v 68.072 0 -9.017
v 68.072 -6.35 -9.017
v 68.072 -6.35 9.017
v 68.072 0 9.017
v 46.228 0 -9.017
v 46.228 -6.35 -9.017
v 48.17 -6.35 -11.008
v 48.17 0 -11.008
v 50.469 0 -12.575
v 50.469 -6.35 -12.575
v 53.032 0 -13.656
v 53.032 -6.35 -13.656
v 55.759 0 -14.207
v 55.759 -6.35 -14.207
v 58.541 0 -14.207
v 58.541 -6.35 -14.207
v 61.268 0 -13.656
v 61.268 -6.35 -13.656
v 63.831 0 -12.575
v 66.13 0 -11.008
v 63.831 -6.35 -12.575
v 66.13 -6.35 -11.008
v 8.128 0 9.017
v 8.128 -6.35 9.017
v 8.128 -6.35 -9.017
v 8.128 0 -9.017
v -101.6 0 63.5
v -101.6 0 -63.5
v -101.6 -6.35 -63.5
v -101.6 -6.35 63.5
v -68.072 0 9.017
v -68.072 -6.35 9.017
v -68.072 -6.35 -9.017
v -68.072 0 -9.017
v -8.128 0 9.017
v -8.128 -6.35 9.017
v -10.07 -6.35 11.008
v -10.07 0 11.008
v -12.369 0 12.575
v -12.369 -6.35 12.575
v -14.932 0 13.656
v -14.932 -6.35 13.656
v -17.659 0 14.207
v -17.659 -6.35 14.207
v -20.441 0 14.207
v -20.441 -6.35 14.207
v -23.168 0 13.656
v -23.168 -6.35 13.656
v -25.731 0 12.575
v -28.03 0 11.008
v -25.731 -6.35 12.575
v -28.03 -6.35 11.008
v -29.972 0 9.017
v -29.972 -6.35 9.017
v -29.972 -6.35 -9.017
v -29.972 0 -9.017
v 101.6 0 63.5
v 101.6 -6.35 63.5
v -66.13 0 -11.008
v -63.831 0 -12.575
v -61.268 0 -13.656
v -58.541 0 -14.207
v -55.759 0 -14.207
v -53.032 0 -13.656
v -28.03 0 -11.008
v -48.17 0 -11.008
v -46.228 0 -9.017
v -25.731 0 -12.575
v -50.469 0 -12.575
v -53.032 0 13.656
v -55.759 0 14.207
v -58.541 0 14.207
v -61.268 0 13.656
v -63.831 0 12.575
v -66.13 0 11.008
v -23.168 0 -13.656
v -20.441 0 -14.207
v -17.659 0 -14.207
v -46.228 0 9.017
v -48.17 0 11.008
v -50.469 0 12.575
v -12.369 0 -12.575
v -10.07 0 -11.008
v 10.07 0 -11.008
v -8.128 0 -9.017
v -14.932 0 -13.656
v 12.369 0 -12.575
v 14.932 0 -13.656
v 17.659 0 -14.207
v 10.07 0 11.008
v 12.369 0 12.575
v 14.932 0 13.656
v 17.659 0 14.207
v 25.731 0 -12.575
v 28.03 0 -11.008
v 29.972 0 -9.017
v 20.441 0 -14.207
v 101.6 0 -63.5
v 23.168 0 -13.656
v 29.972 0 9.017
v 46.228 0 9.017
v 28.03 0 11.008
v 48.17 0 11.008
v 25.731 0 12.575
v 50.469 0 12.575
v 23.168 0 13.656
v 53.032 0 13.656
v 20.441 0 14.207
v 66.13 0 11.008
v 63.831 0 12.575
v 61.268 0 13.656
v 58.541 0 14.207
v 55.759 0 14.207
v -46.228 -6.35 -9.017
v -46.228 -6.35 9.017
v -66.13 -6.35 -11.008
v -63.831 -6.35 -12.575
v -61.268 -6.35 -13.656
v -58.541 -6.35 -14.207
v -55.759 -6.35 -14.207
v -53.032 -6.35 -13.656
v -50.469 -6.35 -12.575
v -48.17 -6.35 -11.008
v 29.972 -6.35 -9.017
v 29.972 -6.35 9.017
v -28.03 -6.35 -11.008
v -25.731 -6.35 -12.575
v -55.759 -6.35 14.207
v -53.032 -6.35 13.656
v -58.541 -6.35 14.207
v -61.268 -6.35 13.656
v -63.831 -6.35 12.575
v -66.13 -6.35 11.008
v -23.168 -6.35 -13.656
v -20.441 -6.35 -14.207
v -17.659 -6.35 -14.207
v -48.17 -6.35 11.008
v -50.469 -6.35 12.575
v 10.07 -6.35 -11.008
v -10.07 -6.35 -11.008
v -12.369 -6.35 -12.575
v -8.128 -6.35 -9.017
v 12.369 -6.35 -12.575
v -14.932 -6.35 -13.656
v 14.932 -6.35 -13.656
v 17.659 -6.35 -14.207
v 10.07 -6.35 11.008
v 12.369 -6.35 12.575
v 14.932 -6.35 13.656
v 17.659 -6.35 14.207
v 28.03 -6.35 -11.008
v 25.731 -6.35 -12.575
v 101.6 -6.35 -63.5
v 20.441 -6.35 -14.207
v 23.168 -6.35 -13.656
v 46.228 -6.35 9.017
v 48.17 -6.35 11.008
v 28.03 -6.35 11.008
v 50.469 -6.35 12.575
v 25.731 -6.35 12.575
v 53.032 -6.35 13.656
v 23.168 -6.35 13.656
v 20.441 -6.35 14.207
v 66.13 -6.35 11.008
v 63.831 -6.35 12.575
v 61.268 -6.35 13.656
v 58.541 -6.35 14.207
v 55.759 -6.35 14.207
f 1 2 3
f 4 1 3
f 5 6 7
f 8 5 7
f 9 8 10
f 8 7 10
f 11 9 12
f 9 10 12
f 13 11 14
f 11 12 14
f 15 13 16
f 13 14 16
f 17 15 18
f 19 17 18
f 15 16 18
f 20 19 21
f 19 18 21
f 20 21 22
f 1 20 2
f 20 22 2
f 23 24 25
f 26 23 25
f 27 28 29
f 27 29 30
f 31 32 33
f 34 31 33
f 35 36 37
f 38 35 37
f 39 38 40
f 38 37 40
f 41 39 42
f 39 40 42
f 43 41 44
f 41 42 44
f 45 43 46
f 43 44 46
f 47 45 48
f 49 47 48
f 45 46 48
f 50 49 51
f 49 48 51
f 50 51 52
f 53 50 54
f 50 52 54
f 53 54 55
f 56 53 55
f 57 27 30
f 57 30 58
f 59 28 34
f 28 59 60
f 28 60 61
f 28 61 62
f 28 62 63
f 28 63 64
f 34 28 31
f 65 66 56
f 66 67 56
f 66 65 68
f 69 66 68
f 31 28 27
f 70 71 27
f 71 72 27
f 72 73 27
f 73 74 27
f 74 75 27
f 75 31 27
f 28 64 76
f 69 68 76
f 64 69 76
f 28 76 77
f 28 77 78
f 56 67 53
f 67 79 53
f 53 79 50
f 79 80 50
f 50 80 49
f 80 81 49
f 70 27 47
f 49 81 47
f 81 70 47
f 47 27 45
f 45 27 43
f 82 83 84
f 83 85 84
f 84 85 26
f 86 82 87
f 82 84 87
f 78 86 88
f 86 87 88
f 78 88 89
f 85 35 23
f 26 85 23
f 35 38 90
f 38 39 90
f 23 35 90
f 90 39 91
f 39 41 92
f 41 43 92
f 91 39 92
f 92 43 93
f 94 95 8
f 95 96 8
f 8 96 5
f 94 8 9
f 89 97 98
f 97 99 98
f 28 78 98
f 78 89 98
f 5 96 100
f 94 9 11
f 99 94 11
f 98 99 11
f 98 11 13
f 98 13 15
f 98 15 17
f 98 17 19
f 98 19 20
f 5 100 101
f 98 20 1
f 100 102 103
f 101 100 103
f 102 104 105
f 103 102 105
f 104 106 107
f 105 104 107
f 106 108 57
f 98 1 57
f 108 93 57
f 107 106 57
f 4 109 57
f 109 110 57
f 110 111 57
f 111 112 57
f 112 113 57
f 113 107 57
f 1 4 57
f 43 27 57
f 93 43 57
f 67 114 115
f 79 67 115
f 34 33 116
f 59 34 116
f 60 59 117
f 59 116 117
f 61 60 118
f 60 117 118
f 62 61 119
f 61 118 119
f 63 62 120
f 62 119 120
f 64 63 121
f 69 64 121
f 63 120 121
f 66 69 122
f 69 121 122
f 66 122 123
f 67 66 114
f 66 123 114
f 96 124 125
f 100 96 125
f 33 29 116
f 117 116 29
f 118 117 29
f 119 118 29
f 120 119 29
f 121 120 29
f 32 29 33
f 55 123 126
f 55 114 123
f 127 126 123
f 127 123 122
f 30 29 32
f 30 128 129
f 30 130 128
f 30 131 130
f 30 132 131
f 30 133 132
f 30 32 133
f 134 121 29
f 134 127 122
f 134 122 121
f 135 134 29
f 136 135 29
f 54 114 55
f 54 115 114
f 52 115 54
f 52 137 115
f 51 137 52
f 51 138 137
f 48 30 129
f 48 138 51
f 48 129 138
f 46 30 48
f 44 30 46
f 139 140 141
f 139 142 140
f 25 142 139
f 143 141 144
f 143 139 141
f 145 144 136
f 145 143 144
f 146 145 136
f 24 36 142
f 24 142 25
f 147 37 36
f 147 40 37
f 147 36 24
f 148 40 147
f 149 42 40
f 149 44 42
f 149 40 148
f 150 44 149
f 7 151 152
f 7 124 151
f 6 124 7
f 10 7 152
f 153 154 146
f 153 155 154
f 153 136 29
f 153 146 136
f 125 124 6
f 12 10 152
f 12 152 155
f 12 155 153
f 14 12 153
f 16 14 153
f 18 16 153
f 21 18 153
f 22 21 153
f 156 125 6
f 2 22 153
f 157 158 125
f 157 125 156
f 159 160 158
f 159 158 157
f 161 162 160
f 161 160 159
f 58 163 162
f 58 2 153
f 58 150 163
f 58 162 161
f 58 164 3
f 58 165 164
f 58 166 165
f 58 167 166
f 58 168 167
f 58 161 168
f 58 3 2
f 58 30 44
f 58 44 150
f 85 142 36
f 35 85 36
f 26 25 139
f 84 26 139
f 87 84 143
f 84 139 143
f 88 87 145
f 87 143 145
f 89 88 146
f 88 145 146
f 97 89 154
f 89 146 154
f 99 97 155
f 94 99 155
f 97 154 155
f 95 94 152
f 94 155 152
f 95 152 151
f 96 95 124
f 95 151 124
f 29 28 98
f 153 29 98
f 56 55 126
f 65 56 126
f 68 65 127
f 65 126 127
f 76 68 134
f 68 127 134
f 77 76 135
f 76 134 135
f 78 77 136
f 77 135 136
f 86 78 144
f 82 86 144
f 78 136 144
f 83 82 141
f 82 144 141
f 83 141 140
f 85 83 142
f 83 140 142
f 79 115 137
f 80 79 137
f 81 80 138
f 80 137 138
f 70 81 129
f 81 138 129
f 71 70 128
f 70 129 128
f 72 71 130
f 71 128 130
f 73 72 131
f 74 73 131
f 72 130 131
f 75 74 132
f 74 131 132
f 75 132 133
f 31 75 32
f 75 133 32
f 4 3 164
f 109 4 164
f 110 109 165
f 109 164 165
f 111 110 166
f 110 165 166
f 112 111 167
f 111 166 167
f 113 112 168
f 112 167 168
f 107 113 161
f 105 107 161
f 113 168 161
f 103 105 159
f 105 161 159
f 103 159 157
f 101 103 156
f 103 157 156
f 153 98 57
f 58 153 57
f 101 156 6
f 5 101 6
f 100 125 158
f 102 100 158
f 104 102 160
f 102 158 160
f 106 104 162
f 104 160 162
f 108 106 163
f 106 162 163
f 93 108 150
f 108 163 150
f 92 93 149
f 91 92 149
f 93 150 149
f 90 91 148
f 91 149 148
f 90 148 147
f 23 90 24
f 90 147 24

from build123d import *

# Parameters (mm, degrees)
F0_W     = 203.2
F0_H     = 127
F1_DEPTH = 6.35
F3_DEPTH = 6.35


with BuildPart() as f1:
    # F0 (on Front) → F1 (new body)
    with BuildSketch(Plane.XZ):
        Rectangle(F0_W, F0_H)
    extrude(amount=F1_DEPTH)

    # F2 (on face) → F3 (cut, through all)
    with BuildSketch(Plane.XZ.offset(6.35)):
        with BuildLine():
            Line((-68.072, 9.017), (-68.072, 0))
            Line((-68.072, 0), (-68.072, -9.017))
            ThreePointArc((-68.072, -9.017), (-57.15, -14.276614), (-46.228, -9.017))
            Line((-46.228, -9.017), (-46.228, 0))
            Line((-46.228, 0), (-46.228, 9.017))
            ThreePointArc((-46.228, 9.017), (-57.15, 14.276614), (-68.072, 9.017))
        make_face()
        with BuildLine():
            Line((-29.972, 9.017), (-29.972, 0))
            Line((-29.972, 0), (-29.972, -9.017))
            ThreePointArc((-29.972, -9.017), (-19.05, -14.276614), (-8.128, -9.017))
            Line((-8.128, -9.017), (-8.128, 0))
            Line((-8.128, 0), (-8.128, 9.017))
            ThreePointArc((-8.128, 9.017), (-19.05, 14.276614), (-29.972, 9.017))
        make_face()
        with BuildLine():
            Line((8.128, 9.017), (8.128, 0))
            Line((8.128, 0), (8.128, -9.017))
            ThreePointArc((8.128, -9.017), (19.05, -14.276614), (29.972, -9.017))
            Line((29.972, -9.017), (29.972, 0))
            Line((29.972, 0), (29.972, 9.017))
            ThreePointArc((29.972, 9.017), (19.05, 14.276614), (8.128, 9.017))
        make_face()
        with BuildLine():
            Line((46.228, 9.017), (46.228, 0))
            Line((46.228, 0), (46.228, -9.017))
            ThreePointArc((46.228, -9.017), (57.15, -14.276614), (68.072, -9.017))
            Line((68.072, -9.017), (68.072, 0))
            Line((68.072, 0), (68.072, 9.017))
            ThreePointArc((68.072, 9.017), (57.15, 14.276614), (46.228, 9.017))
        make_face()
    extrude(amount=-F3_DEPTH, mode=Mode.SUBTRACT)


solid = f1.part
